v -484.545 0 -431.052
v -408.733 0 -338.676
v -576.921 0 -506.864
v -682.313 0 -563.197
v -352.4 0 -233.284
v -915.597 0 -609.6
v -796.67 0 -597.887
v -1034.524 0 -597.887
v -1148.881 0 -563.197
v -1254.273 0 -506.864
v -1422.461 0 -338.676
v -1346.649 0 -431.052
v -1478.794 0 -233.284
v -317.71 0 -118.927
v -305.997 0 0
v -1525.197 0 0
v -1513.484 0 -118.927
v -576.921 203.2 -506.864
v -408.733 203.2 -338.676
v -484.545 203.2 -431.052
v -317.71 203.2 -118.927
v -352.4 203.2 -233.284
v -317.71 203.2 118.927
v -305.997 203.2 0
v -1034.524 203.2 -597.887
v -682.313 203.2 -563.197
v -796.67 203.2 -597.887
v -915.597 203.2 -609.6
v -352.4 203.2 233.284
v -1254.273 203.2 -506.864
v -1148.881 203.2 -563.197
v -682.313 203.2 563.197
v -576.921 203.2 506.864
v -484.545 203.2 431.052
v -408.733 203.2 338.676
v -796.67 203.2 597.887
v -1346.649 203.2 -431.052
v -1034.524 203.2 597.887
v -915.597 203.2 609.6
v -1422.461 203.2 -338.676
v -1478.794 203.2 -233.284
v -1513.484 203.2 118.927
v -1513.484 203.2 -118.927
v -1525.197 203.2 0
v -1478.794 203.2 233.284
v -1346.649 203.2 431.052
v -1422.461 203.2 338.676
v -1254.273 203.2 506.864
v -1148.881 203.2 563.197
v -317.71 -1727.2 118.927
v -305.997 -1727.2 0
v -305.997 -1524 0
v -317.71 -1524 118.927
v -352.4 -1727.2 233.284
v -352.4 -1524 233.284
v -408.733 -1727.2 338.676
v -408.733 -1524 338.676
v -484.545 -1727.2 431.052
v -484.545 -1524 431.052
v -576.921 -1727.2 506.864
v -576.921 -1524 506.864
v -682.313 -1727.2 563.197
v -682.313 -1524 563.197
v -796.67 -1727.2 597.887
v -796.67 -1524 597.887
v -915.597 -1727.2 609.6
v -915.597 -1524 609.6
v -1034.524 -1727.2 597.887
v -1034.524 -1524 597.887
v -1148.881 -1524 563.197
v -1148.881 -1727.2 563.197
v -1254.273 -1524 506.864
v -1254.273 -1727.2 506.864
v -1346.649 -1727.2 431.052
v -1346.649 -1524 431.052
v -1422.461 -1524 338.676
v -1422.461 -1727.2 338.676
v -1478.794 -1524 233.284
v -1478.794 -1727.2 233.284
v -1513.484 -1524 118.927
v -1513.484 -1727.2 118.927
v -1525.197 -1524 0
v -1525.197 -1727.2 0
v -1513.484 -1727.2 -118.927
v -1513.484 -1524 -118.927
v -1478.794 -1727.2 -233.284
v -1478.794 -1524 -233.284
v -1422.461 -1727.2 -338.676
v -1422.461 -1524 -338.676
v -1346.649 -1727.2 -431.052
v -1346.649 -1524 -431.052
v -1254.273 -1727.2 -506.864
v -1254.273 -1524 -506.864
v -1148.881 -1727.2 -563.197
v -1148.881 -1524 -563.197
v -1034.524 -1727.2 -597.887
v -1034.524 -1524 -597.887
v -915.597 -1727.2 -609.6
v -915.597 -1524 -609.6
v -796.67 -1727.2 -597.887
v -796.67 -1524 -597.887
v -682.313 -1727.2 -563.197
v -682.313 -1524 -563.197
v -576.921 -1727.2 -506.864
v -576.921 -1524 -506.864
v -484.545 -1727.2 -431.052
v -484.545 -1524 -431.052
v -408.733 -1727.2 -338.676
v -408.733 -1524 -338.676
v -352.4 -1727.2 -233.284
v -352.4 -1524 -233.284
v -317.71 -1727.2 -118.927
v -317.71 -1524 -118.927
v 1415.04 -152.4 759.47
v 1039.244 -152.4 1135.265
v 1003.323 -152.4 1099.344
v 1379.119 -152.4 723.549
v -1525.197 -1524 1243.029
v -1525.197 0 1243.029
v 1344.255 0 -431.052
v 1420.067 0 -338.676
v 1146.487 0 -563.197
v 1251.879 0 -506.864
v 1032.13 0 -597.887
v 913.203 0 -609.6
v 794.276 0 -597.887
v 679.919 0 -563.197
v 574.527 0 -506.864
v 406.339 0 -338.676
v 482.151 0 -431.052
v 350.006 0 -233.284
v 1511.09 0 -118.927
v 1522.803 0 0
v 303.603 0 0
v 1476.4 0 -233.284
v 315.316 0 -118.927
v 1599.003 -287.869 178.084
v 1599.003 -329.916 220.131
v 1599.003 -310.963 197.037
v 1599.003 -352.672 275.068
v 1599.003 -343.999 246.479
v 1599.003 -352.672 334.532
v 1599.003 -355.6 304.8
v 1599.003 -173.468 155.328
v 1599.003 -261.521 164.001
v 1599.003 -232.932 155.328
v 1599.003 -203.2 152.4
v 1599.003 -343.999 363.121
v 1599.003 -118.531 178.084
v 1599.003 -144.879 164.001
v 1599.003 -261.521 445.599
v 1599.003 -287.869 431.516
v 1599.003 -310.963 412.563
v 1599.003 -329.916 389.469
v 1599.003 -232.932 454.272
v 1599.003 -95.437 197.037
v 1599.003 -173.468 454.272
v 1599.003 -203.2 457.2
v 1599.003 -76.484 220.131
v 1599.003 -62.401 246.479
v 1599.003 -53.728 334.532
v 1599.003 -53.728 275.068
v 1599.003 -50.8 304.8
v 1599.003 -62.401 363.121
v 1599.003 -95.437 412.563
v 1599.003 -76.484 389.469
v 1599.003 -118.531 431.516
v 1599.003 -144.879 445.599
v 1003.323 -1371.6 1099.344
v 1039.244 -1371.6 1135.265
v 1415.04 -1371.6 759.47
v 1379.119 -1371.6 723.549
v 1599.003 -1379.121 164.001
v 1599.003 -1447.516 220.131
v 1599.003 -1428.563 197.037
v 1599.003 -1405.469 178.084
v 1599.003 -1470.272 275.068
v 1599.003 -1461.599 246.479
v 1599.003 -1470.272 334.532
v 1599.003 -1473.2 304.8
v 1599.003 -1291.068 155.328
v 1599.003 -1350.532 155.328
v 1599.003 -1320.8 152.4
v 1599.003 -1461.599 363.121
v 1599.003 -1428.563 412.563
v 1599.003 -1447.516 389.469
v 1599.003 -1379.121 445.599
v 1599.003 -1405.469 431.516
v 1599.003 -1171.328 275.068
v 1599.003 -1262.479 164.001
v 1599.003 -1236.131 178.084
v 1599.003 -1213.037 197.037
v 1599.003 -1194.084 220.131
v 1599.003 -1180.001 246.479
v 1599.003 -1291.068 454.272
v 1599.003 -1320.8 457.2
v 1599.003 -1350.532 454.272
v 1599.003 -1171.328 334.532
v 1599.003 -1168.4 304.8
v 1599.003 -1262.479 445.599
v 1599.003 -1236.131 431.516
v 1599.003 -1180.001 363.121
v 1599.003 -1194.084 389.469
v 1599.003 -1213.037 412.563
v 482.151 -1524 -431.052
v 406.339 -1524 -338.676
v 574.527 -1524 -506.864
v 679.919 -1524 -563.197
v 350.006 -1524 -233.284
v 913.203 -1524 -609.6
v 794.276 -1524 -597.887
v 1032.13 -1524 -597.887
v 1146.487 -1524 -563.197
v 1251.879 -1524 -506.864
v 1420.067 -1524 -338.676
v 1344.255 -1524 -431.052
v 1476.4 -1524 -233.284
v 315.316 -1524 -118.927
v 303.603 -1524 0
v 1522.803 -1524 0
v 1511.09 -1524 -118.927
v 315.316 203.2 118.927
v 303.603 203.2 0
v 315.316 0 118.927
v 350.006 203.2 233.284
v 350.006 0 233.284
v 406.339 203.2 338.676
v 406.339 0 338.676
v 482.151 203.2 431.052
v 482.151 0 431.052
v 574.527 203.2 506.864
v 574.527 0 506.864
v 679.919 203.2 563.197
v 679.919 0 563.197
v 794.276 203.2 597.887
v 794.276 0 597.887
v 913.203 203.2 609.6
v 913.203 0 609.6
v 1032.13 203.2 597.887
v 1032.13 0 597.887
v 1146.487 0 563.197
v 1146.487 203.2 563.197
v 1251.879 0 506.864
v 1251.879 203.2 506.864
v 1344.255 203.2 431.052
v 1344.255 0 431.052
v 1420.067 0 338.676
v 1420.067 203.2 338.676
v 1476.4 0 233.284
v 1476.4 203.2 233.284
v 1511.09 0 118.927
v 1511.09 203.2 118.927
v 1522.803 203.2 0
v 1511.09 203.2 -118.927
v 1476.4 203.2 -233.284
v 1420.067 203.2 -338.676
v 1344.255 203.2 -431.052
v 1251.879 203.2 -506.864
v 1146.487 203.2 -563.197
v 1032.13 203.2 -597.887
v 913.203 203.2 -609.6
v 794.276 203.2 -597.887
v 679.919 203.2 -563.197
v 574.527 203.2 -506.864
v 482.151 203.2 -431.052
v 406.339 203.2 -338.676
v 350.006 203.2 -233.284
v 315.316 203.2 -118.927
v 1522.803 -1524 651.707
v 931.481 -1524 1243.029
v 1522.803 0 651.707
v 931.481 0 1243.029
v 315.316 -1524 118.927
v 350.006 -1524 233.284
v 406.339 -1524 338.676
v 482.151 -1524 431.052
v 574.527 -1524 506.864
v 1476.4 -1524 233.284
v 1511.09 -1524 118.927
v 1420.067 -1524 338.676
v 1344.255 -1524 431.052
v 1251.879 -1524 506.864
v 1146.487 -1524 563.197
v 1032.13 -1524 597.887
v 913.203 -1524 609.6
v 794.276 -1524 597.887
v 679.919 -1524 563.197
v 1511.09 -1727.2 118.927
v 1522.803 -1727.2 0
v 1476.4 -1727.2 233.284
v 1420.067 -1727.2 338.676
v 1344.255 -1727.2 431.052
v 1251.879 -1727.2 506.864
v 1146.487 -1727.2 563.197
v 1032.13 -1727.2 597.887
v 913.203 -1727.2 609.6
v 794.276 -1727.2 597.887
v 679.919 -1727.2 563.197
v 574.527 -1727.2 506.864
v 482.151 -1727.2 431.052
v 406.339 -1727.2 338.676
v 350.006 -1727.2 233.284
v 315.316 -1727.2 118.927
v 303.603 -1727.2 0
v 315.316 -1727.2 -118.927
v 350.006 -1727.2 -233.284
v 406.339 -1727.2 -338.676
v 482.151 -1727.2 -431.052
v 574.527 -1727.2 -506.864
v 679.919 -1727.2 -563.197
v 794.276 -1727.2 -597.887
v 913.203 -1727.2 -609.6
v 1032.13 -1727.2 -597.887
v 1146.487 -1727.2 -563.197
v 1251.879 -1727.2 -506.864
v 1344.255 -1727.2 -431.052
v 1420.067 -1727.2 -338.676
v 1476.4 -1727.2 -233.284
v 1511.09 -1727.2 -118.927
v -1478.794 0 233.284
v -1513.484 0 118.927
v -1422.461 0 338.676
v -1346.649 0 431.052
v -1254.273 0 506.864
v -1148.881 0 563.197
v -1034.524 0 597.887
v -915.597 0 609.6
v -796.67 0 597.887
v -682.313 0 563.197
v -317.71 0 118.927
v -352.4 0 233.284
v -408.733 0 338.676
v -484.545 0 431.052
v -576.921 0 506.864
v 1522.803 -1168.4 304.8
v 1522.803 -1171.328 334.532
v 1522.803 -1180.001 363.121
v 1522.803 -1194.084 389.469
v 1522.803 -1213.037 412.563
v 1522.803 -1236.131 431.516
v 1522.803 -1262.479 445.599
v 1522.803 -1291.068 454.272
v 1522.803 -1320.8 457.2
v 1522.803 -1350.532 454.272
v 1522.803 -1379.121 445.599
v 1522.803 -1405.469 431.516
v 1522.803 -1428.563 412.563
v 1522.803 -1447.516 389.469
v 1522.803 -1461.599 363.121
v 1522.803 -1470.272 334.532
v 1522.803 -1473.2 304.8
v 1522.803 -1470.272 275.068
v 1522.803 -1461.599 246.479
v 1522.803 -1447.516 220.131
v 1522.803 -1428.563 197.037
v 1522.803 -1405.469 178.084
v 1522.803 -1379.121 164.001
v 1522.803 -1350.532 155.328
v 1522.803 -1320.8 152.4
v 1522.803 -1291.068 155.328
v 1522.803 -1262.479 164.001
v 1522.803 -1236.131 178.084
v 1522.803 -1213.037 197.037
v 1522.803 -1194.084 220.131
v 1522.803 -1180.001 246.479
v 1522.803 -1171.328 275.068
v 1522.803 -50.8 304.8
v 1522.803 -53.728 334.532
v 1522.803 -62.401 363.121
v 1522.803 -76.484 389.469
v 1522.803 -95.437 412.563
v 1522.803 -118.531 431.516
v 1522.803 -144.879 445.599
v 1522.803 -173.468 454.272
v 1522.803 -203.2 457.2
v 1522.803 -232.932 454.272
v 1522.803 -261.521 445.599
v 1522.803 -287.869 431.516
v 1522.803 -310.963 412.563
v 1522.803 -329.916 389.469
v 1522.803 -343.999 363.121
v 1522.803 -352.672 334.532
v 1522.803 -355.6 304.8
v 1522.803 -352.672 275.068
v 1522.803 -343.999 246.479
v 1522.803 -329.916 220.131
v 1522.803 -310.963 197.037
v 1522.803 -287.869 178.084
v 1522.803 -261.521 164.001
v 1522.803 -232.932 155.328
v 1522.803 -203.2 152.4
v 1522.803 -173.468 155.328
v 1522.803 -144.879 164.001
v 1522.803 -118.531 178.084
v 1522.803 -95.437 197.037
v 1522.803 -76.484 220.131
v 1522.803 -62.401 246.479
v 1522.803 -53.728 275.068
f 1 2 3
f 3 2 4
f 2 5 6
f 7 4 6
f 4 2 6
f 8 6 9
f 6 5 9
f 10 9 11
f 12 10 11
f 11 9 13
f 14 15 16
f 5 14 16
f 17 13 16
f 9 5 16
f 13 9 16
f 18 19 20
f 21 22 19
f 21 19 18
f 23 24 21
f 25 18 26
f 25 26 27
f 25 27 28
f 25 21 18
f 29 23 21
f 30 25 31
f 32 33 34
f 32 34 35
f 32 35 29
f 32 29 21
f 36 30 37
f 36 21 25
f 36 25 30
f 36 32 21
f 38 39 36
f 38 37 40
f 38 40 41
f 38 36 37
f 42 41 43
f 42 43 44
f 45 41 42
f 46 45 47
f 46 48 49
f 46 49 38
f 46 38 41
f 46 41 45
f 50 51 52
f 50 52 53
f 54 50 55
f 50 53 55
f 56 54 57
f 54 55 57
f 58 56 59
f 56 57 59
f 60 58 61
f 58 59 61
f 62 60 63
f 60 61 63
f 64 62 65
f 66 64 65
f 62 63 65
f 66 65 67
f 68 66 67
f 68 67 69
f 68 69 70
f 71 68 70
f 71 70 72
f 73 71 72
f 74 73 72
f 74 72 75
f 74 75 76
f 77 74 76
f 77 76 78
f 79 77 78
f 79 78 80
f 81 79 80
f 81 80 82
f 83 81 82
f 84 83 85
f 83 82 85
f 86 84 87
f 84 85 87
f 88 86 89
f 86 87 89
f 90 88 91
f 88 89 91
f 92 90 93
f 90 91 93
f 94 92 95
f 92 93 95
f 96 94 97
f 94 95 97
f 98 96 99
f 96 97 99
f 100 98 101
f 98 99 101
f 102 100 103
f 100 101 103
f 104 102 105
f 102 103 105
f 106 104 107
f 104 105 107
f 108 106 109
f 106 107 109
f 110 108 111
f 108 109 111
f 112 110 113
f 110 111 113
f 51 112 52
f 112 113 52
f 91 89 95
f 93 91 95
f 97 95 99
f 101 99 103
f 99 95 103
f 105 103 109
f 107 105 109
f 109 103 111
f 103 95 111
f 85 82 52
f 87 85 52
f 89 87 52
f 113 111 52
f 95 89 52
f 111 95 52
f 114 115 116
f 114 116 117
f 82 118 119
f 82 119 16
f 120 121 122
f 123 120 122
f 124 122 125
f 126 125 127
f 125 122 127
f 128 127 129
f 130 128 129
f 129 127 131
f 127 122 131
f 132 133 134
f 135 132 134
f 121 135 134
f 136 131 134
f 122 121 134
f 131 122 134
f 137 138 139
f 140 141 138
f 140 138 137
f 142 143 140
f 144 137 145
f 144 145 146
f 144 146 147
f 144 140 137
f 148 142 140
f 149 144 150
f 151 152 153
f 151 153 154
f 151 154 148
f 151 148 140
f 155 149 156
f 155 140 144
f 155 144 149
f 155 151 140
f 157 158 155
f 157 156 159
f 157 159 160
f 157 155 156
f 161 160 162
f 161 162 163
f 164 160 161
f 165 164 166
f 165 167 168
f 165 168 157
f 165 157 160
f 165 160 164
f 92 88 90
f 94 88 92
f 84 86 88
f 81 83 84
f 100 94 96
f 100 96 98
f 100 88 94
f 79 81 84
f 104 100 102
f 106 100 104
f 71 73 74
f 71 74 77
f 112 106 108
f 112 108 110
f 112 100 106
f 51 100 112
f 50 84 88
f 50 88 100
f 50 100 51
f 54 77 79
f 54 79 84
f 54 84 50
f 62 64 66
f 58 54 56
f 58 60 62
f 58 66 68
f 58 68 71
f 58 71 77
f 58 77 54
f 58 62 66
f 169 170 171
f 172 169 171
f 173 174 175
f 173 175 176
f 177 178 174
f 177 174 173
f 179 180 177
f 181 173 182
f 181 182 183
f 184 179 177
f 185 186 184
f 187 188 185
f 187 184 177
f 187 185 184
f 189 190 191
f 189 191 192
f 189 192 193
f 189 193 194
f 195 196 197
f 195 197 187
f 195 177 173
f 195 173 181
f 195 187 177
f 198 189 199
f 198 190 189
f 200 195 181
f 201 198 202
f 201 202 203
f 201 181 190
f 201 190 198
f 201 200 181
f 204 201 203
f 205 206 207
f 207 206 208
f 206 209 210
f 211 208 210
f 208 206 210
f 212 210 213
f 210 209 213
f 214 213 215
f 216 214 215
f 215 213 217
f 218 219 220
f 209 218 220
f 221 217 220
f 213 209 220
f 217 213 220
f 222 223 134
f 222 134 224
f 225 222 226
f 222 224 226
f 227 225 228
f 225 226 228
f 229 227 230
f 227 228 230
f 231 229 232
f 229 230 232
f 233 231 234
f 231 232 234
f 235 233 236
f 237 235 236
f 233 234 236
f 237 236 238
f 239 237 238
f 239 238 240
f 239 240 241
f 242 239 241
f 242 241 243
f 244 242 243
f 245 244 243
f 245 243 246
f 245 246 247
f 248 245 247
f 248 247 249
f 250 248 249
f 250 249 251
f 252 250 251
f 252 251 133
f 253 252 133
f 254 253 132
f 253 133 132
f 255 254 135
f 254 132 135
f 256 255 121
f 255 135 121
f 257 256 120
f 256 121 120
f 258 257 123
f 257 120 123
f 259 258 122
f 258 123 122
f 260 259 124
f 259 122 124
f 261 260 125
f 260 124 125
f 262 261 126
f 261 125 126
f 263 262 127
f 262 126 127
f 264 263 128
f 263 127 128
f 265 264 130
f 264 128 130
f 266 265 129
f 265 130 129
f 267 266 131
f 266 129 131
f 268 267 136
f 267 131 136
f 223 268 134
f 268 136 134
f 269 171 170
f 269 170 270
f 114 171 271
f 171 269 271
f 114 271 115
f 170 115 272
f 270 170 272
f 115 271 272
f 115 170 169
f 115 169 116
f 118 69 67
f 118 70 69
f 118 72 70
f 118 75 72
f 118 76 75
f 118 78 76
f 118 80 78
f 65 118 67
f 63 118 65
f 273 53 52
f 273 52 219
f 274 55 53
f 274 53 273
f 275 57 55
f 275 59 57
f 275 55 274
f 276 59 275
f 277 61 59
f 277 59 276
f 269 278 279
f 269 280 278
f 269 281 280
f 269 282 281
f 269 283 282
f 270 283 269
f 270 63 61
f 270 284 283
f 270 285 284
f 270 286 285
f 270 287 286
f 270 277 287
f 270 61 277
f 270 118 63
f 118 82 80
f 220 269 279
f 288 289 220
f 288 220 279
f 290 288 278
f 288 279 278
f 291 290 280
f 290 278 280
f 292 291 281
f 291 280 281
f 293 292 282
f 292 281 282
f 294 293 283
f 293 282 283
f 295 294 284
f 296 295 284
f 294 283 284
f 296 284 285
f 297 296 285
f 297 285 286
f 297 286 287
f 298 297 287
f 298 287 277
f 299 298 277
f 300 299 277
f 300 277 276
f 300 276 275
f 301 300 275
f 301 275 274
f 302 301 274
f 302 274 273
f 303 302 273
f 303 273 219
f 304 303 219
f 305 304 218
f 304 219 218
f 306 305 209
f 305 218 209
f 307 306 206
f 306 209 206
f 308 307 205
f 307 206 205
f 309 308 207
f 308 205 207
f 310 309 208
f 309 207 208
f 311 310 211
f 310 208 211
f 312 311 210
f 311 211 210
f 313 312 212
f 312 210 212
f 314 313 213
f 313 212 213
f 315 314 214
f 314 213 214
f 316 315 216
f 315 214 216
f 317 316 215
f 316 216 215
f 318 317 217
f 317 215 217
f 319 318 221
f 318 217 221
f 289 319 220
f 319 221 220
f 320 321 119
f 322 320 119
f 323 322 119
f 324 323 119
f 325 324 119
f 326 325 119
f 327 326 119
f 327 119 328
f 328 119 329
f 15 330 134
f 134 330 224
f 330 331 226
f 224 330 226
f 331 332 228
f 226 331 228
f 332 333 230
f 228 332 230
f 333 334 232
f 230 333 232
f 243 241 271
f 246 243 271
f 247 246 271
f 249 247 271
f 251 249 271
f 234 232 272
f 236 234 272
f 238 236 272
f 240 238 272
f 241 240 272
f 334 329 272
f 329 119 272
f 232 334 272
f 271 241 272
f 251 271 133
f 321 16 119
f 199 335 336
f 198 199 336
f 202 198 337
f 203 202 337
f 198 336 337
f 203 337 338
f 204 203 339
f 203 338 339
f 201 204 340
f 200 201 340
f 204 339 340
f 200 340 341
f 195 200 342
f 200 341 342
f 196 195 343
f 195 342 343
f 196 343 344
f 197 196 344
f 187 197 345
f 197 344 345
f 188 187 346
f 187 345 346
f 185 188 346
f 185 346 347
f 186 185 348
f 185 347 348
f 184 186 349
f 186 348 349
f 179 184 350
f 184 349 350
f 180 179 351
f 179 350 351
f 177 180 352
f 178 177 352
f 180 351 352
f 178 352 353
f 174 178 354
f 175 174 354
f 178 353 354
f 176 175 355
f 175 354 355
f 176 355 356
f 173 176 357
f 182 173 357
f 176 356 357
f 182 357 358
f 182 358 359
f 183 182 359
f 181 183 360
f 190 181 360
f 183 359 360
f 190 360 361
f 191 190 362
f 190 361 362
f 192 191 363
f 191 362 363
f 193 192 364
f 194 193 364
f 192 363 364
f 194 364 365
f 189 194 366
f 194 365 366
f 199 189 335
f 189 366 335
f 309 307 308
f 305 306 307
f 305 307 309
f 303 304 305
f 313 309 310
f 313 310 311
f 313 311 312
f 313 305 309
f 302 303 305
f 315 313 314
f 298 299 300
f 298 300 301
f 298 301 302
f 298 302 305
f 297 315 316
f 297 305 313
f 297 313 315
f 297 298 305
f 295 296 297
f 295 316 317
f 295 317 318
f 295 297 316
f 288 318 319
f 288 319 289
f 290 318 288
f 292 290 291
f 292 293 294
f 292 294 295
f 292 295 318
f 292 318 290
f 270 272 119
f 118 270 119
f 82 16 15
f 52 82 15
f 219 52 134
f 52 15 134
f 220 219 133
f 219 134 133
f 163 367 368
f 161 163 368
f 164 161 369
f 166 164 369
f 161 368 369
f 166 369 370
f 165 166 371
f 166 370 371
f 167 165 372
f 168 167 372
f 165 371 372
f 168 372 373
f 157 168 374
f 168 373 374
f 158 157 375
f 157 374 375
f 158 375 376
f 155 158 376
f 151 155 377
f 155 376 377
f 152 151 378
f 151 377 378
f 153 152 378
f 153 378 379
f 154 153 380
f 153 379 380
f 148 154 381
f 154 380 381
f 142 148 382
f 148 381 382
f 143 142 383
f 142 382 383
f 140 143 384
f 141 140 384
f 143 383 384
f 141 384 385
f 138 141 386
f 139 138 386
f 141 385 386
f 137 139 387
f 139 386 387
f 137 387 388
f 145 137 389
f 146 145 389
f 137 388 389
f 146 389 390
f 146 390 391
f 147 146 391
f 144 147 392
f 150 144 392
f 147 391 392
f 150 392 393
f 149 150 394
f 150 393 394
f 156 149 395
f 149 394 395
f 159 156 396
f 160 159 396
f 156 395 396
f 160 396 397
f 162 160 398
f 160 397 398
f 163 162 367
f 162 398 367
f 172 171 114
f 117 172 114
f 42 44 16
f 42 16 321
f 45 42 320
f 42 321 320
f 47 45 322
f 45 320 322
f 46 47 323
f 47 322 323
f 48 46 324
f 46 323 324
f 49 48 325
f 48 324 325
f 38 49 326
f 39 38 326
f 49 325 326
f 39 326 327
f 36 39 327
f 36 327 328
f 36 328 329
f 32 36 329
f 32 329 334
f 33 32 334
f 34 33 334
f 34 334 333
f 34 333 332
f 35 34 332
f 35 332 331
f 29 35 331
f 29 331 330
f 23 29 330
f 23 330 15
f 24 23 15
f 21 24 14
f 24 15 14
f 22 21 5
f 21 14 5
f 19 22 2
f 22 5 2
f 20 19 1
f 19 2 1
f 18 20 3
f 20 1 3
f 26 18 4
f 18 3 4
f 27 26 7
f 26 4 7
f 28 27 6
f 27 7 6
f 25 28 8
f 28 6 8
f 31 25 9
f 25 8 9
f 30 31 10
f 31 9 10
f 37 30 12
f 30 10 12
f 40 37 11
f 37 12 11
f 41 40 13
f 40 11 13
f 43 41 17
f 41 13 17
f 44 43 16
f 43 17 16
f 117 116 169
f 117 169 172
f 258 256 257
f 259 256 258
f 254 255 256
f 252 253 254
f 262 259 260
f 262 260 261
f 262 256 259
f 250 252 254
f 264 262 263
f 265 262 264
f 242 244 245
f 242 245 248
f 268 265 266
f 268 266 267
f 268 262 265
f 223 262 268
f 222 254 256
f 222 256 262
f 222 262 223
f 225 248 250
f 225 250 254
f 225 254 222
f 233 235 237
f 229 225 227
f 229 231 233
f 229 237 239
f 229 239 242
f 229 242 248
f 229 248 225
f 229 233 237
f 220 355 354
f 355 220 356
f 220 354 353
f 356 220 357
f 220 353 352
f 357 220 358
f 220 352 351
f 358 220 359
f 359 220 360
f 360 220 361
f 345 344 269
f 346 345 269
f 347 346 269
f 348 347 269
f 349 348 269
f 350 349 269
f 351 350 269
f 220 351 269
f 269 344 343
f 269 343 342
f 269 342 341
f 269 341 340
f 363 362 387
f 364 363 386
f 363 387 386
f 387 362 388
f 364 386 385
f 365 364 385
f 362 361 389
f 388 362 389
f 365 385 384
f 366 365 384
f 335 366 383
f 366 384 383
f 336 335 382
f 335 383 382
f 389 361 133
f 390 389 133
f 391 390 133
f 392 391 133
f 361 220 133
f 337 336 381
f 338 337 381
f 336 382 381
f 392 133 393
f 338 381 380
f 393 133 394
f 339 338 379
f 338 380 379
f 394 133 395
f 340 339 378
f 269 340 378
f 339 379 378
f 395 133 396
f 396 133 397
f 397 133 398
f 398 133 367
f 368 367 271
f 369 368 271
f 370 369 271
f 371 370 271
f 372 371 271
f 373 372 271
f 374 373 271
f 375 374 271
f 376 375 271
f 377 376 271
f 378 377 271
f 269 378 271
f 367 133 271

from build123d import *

# Parameters (mm, degrees)
F1_DEPTH = 1524
F2_R     = 152.4
F3_DEPTH = 76.2
F4_W     = 531.455103
F4_H     = 1219.2
F5_DEPTH = 50.8
F6_R     = 609.6
F7_DEPTH = 203.2
F8_R     = 609.6
F9_DEPTH = 203.2


with BuildPart() as f1:
    # F0 (on Front) → F1 (new body)
    with BuildSketch(Plane.XZ):
        Polygon((-1525.196942, 0), (0, 0), (1522.803058, 0), (1522.803058, 651.706862), (931.481404, 1243.028516), (-1525.196942, 1243.028516), align=None)
    extrude(amount=F1_DEPTH)

    # F2 (on face) → F3 (join)
    with BuildSketch(Plane.YZ.offset(1522.803058)):
        with Locations((-203.2, 304.8)):
            Circle(F2_R)
        with Locations((-1320.8, 304.8)):
            Circle(F2_R)
    extrude(amount=F3_DEPTH)

    # F4 (on face) → F5 (cut)
    with BuildSketch(Plane(origin=(1087.25496, 0, 1087.25496), x_dir=(0.707107, 0, -0.707107), z_dir=(0.707107, 0, 0.707107))):
        with Locations((197.830476, -762)):
            Rectangle(F4_W, F4_H)
    extrude(amount=-F5_DEPTH, mode=Mode.SUBTRACT)

    # F6 (on face) → F7 (join)
    with BuildSketch(Plane(origin=(0, 0, 0), x_dir=(-1, 0, 0), z_dir=(0, 1, 0))):
        with Locations((-913.203058, 0)):
            Circle(F6_R)
        with Locations((915.596942, 0)):
            Circle(F6_R)
    extrude(amount=F7_DEPTH)

    # F8 (on face) → F9 (join)
    with BuildSketch(Plane.XZ.offset(1524)):
        with Locations((-915.596942, 0)):
            Circle(F8_R)
        with Locations((913.203058, 0)):
            Circle(F8_R)
    extrude(amount=F9_DEPTH)


solid = f1.part
